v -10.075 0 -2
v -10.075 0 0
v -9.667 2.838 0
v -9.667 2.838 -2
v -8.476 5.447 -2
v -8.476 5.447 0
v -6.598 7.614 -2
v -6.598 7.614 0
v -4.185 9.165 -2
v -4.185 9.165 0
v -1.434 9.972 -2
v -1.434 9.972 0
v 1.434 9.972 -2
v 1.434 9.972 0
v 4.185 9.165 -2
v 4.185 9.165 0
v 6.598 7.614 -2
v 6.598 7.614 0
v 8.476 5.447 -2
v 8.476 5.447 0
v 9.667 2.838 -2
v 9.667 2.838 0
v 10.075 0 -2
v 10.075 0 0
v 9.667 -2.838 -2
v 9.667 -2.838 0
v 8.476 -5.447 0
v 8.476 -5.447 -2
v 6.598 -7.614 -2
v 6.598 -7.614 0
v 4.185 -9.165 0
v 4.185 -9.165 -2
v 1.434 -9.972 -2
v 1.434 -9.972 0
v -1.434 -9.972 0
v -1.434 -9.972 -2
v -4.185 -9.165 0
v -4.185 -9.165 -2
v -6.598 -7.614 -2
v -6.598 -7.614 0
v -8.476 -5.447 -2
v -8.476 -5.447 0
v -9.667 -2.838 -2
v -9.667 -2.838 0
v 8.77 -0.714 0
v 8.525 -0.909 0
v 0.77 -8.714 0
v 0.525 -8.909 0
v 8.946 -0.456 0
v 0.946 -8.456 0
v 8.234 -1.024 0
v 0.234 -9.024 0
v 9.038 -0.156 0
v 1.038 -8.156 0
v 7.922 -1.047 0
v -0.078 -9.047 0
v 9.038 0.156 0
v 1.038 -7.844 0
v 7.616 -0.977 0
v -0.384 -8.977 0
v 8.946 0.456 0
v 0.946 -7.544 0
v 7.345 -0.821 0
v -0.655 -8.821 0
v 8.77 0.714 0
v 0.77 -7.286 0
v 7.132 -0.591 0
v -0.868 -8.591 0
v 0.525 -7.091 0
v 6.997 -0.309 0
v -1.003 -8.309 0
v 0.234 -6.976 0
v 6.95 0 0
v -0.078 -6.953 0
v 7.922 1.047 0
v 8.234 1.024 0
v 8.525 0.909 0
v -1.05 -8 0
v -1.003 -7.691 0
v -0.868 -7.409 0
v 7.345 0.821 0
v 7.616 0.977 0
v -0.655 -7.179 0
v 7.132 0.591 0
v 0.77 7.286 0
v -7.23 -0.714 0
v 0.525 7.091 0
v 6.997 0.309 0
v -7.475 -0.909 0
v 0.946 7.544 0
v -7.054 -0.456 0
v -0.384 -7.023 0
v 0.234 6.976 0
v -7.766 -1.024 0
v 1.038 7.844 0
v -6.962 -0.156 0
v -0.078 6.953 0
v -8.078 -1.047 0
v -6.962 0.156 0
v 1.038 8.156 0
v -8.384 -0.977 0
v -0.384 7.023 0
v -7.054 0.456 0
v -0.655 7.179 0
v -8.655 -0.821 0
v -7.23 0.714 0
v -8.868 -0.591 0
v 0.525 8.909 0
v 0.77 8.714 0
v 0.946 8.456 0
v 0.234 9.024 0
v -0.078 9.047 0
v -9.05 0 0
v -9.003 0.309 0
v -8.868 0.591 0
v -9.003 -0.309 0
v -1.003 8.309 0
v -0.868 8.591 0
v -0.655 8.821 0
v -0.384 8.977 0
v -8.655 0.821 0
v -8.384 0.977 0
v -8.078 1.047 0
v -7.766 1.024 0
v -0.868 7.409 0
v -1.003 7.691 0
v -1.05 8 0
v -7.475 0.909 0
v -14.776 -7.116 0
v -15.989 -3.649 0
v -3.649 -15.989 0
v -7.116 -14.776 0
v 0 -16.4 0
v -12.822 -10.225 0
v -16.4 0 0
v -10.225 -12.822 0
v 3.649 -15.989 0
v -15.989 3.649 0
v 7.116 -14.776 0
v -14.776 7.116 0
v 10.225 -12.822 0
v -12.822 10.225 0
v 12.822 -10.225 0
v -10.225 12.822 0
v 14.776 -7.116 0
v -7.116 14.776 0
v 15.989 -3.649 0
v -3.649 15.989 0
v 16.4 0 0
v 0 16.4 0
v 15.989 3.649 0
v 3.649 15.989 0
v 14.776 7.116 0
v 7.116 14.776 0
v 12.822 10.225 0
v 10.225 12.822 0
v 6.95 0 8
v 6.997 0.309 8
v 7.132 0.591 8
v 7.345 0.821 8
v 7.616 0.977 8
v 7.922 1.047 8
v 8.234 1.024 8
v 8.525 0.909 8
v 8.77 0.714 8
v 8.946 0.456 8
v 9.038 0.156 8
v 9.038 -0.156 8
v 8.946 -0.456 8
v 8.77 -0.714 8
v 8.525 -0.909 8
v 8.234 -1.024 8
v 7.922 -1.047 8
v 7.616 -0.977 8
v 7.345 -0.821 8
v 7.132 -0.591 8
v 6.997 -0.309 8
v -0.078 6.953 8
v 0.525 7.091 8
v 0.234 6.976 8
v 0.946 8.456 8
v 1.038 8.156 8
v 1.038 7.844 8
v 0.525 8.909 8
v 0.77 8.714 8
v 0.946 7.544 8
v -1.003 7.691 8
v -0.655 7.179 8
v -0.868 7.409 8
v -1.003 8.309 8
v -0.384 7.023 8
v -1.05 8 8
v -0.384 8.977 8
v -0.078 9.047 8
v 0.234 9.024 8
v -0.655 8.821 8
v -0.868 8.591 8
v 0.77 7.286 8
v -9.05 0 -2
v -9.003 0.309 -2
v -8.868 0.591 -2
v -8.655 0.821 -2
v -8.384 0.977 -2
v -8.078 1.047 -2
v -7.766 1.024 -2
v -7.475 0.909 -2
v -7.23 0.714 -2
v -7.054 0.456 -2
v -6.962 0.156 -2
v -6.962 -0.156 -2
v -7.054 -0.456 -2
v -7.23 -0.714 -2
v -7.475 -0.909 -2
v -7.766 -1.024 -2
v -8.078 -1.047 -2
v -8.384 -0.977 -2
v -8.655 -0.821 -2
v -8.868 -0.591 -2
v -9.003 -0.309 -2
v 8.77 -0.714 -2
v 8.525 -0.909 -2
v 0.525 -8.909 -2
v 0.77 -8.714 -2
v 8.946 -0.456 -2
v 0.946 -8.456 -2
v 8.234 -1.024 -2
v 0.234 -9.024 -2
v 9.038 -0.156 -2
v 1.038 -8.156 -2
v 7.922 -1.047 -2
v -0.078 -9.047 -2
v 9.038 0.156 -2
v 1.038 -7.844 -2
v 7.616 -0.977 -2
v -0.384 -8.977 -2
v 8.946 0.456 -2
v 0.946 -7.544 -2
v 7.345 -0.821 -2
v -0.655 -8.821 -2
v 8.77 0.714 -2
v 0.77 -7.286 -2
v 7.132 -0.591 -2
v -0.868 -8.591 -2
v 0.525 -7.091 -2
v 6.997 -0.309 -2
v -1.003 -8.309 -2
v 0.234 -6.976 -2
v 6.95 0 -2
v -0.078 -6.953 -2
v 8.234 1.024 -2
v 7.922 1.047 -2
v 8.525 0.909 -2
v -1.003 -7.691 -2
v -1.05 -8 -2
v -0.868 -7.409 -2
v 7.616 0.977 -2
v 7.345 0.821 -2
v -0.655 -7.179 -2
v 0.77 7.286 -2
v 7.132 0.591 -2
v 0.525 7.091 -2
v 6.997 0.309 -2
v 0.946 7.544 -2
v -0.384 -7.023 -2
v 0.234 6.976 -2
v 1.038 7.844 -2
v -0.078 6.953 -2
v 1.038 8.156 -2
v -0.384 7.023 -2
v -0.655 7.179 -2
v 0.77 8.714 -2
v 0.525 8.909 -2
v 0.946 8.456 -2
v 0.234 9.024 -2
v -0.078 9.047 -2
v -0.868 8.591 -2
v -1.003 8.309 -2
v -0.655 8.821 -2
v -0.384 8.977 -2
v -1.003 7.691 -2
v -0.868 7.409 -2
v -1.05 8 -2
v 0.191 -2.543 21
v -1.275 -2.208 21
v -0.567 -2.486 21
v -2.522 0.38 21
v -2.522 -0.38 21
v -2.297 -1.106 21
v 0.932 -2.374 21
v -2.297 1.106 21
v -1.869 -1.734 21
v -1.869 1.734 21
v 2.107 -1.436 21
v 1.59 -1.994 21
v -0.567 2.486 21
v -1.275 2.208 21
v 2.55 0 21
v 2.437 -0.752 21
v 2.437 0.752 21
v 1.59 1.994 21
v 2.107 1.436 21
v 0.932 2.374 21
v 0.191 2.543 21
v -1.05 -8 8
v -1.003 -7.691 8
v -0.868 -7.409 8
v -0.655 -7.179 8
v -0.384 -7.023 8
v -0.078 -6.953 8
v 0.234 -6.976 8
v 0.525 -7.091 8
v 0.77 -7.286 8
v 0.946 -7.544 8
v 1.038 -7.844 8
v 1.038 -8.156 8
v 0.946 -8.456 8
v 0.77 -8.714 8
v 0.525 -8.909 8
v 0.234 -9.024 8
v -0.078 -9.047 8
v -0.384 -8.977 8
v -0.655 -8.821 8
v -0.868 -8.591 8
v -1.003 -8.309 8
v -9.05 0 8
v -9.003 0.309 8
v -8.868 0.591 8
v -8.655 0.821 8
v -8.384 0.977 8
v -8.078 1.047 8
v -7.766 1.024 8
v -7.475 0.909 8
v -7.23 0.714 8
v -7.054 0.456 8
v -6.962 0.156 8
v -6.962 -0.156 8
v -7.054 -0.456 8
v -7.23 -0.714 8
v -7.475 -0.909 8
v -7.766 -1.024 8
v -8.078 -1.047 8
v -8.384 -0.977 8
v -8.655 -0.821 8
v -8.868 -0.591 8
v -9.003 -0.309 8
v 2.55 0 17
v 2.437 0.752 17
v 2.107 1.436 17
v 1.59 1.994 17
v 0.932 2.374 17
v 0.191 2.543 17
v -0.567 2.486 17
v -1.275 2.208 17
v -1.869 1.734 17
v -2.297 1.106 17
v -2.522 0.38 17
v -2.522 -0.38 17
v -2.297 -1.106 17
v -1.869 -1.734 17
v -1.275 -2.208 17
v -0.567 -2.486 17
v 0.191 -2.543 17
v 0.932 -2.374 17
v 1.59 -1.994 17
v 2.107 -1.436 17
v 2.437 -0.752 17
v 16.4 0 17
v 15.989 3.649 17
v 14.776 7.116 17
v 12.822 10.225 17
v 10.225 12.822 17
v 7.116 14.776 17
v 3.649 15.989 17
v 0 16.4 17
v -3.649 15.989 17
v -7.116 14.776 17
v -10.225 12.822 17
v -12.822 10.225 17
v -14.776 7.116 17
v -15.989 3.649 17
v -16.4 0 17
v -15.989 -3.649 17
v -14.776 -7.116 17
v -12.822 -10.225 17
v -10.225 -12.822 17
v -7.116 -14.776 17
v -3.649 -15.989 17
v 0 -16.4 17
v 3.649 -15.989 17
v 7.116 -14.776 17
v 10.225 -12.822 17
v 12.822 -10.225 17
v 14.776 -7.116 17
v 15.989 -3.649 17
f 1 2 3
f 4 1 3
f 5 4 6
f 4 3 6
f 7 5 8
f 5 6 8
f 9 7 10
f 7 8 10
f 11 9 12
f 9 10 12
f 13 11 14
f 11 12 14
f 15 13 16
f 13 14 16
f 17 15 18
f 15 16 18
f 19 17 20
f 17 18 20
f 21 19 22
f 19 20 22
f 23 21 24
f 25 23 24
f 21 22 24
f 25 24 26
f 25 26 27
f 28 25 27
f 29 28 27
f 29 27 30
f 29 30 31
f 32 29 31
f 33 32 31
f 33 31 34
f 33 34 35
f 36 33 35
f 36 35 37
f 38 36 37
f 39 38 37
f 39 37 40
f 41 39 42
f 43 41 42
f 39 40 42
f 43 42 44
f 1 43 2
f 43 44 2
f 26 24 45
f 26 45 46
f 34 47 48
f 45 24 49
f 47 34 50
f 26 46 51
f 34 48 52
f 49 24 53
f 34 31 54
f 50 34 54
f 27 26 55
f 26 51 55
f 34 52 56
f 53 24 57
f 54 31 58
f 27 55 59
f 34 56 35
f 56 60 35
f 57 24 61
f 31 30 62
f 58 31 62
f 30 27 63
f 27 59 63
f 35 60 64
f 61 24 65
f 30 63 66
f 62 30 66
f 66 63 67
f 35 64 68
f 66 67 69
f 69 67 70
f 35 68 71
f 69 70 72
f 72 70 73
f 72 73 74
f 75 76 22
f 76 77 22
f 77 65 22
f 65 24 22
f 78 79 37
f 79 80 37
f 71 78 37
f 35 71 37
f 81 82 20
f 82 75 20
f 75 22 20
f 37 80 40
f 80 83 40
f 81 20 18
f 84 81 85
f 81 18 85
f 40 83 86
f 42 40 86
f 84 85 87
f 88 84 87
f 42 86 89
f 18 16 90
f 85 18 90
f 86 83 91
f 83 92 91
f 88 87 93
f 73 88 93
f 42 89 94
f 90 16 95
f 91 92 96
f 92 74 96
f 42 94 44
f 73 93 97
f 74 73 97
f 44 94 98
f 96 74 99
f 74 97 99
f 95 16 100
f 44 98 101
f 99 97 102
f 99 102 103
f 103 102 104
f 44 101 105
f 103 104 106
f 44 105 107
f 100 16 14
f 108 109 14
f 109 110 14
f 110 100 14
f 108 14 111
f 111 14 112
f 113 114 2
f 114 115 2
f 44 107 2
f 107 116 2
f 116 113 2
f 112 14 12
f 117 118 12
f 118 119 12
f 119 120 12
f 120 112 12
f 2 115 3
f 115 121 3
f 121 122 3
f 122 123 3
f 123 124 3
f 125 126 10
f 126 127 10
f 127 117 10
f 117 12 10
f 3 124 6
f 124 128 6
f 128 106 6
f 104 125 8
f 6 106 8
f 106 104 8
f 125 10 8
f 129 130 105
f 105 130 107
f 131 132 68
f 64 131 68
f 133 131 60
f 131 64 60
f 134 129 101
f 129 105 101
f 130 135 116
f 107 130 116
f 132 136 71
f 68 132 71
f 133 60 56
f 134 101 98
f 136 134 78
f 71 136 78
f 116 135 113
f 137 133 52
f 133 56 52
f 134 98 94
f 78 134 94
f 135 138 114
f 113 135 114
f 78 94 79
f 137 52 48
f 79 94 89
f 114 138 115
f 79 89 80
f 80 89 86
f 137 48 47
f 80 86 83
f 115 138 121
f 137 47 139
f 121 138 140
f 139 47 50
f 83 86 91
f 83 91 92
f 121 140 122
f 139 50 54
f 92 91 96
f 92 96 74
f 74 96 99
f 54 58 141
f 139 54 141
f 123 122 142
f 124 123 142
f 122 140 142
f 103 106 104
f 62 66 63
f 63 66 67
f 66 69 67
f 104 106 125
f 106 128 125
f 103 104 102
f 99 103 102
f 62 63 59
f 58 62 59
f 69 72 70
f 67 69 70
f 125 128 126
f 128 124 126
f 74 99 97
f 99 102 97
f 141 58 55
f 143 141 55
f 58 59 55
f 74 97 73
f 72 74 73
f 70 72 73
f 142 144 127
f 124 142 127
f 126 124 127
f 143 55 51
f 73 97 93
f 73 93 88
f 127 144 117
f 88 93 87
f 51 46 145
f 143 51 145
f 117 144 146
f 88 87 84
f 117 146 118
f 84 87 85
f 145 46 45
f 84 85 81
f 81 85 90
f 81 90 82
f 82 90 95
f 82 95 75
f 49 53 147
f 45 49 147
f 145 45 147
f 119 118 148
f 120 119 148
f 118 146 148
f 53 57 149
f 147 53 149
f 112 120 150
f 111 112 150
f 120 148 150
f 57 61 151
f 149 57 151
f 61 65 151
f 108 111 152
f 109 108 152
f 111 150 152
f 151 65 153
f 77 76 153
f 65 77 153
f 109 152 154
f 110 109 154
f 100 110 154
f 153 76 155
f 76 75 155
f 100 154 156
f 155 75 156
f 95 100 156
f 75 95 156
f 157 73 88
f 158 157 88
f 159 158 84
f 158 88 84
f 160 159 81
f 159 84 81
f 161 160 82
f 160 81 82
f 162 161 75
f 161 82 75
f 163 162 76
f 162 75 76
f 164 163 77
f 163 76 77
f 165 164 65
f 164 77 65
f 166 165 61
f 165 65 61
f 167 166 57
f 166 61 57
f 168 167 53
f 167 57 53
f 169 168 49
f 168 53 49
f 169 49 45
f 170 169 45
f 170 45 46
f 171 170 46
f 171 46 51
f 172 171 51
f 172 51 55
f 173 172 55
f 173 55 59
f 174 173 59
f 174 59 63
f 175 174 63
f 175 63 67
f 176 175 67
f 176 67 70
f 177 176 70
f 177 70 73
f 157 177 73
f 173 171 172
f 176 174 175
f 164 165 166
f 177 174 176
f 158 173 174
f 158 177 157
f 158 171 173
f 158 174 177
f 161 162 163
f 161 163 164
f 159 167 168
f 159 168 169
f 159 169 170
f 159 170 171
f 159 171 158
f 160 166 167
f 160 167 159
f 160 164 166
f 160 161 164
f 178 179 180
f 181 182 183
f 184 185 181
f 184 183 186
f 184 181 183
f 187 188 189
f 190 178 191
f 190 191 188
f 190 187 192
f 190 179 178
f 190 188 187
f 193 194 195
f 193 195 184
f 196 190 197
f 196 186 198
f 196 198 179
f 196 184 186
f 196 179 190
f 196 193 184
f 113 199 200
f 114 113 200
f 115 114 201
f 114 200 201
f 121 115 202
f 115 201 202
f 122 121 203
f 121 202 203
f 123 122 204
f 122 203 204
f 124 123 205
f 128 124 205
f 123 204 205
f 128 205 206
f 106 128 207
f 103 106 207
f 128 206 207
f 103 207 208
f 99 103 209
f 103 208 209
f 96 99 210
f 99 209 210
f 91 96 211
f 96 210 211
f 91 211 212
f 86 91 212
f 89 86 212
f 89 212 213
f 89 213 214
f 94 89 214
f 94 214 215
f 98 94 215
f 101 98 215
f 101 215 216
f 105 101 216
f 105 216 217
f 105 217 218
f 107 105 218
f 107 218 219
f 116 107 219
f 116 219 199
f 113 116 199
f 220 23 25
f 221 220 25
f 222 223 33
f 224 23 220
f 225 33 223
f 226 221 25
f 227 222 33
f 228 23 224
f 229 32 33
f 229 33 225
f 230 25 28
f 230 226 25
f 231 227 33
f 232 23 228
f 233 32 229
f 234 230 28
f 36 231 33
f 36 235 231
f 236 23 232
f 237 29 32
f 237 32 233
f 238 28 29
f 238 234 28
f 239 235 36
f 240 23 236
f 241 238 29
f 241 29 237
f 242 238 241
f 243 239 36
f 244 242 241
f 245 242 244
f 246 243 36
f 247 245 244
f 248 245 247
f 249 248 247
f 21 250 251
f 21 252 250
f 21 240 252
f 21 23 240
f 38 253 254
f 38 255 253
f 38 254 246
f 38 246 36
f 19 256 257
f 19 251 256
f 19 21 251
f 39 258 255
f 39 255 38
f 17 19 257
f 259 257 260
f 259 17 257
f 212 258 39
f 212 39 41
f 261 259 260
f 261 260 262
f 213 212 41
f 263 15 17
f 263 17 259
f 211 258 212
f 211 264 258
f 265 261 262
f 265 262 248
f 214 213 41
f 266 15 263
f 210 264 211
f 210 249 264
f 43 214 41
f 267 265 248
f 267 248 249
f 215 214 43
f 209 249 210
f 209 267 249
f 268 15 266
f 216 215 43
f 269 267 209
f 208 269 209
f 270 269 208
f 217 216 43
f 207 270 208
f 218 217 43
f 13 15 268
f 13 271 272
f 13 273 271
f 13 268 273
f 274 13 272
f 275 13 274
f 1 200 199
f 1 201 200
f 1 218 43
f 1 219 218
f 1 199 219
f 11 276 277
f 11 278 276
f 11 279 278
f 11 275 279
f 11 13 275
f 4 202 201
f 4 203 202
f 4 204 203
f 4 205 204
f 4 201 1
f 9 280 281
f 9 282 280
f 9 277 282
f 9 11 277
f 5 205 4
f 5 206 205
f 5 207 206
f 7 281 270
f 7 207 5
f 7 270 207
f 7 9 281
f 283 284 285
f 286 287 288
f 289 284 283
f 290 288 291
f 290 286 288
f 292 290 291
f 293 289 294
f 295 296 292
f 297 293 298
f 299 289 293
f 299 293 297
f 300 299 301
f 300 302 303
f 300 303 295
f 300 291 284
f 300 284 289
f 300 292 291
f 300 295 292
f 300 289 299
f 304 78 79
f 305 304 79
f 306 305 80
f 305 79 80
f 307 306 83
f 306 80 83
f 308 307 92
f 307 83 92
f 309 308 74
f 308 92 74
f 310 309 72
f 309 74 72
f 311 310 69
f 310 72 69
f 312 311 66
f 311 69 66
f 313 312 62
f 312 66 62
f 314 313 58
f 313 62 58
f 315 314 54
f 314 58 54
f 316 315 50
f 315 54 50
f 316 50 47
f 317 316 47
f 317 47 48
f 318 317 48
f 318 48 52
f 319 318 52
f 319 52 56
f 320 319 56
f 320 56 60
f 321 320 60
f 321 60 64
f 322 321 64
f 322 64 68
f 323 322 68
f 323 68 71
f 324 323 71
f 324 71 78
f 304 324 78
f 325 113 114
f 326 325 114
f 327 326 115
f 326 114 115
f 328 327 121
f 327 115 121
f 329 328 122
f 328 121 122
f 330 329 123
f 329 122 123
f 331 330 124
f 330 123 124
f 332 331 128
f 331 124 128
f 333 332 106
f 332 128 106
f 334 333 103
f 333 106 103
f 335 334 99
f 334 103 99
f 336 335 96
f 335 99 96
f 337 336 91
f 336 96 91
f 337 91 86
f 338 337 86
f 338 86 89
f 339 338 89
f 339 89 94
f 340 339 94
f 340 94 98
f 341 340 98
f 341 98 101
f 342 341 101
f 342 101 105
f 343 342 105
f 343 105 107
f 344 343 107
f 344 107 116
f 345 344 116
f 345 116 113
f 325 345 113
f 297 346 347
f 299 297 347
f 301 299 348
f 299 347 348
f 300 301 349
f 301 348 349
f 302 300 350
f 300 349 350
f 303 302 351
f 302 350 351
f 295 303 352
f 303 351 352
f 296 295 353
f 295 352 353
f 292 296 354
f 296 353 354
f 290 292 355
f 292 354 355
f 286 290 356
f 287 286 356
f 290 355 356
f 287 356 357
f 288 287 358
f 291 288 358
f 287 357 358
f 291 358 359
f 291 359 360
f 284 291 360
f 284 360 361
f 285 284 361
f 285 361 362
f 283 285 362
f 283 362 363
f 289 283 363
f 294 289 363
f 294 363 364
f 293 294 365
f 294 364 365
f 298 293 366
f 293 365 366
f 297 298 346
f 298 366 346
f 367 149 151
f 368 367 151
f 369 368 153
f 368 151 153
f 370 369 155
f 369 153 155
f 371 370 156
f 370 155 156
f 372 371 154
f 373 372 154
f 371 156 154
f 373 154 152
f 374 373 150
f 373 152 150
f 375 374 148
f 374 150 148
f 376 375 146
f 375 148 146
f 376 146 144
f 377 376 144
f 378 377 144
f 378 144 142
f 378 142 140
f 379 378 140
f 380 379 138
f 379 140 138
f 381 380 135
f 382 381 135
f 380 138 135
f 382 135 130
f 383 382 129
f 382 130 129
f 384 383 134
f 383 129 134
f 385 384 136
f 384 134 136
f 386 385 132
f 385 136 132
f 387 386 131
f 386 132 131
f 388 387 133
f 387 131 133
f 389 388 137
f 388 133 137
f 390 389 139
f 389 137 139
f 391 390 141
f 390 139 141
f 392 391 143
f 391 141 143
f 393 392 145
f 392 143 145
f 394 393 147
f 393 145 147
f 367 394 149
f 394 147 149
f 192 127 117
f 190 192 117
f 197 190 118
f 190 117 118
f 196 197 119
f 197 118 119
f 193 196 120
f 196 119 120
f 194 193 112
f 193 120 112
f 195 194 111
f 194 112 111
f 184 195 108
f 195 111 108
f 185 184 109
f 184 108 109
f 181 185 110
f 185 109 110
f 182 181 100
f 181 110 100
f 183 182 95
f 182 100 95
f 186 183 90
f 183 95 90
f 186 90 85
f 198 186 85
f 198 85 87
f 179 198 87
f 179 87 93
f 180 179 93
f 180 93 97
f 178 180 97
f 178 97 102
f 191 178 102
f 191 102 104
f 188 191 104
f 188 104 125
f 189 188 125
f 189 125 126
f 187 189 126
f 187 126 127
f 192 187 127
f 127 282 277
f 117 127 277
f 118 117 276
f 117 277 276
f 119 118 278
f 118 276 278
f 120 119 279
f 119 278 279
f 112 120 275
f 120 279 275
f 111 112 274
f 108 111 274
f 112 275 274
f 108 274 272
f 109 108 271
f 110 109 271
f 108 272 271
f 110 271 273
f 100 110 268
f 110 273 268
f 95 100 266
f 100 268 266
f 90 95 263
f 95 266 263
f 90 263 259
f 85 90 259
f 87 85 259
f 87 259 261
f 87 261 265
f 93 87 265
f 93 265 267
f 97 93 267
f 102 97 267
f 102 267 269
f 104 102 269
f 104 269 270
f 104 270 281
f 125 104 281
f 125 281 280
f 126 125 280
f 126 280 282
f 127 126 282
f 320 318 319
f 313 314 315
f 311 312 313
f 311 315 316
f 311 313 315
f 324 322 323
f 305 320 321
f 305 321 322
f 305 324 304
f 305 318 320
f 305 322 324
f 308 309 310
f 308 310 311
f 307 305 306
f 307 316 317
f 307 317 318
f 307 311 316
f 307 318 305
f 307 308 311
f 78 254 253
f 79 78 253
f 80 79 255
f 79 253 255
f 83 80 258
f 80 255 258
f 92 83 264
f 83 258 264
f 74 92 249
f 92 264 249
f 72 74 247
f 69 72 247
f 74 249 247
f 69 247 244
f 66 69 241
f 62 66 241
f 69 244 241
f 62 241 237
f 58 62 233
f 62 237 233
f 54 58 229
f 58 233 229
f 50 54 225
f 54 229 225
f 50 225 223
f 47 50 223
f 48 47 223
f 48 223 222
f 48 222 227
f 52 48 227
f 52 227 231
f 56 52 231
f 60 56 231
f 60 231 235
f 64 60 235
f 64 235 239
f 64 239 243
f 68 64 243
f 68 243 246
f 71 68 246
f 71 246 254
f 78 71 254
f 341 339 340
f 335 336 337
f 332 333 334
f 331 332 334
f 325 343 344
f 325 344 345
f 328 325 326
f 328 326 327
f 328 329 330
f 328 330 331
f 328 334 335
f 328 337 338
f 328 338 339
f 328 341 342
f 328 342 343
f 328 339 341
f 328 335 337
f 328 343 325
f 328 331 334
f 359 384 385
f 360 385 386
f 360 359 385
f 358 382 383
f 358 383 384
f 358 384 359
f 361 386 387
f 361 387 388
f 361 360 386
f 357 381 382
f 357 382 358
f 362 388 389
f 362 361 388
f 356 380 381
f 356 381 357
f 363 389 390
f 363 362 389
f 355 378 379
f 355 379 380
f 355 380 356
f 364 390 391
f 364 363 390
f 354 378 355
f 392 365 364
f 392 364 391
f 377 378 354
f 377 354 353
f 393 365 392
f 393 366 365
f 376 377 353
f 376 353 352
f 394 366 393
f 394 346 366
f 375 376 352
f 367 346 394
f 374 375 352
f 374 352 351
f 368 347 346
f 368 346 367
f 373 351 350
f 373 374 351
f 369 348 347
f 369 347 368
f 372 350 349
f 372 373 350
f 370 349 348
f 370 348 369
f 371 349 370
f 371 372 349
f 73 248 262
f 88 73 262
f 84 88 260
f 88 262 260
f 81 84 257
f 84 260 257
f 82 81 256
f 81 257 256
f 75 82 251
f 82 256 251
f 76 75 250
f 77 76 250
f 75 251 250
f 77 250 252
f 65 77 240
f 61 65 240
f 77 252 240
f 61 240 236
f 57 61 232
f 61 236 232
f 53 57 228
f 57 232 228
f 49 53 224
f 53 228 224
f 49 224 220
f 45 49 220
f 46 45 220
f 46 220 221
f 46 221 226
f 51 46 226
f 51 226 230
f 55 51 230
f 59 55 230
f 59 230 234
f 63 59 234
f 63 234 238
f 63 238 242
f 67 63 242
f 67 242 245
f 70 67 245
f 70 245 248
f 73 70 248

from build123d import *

# Parameters (mm, degrees)
SKETCH_1_R          = 16.4
EXTRUDE_1_DEPTH     = 17
SKETCH_2_R          = 2.55
EXTRUDE_2_DEPTH     = 4
SKETCH_3_R          = 10.075
EXTRUDE_3_DEPTH     = 2
SKETCH_7_R          = 1.05
CUT_EXTRUDE_3_DEPTH = 10


with BuildPart() as part:
    # 草图1 → 凸台-拉伸1 (new body)
    with BuildSketch(Plane.XY):
        Circle(SKETCH_1_R)
    extrude(amount=EXTRUDE_1_DEPTH)

    # 草图2 → 凸台-拉伸2 (add)
    with BuildSketch(Plane.XY.offset(17)):
        Circle(SKETCH_2_R)
    extrude(amount=EXTRUDE_2_DEPTH)


with BuildPart() as body_2:
    # 草图3 → 凸台-拉伸3 (new body)
    with BuildSketch(Plane(origin=(0, 0, 0), x_dir=(-1, 0, 0), z_dir=(0, 0, -1))):
        Circle(SKETCH_3_R)
    extrude(amount=EXTRUDE_3_DEPTH)


with BuildPart() as cut_extrude_3_tool:
    # 草图7 → 切除-拉伸3 (new body)
    with BuildSketch(Plane(origin=(0, 0, -2), x_dir=(-1, 0, 0), z_dir=(0, 0, -1))):
        with Locations((0, 8)):
            Circle(SKETCH_7_R)
        with Locations((8, 0)):
            Circle(SKETCH_7_R)
        with Locations((0, -8)):
            Circle(SKETCH_7_R)
        with Locations((-8, 0)):
            Circle(SKETCH_7_R)
    extrude(amount=-CUT_EXTRUDE_3_DEPTH)


with BuildPart() as part_1:
    add(part.part)

    # 切除-拉伸3: cut by cut_extrude_3_tool
    add(cut_extrude_3_tool.part, mode=Mode.SUBTRACT)


with BuildPart() as body_2_1:
    add(body_2.part)

    # 切除-拉伸3: cut by cut_extrude_3_tool
    add(cut_extrude_3_tool.part, mode=Mode.SUBTRACT)


solid = Compound([part_1.part, body_2_1.part])
